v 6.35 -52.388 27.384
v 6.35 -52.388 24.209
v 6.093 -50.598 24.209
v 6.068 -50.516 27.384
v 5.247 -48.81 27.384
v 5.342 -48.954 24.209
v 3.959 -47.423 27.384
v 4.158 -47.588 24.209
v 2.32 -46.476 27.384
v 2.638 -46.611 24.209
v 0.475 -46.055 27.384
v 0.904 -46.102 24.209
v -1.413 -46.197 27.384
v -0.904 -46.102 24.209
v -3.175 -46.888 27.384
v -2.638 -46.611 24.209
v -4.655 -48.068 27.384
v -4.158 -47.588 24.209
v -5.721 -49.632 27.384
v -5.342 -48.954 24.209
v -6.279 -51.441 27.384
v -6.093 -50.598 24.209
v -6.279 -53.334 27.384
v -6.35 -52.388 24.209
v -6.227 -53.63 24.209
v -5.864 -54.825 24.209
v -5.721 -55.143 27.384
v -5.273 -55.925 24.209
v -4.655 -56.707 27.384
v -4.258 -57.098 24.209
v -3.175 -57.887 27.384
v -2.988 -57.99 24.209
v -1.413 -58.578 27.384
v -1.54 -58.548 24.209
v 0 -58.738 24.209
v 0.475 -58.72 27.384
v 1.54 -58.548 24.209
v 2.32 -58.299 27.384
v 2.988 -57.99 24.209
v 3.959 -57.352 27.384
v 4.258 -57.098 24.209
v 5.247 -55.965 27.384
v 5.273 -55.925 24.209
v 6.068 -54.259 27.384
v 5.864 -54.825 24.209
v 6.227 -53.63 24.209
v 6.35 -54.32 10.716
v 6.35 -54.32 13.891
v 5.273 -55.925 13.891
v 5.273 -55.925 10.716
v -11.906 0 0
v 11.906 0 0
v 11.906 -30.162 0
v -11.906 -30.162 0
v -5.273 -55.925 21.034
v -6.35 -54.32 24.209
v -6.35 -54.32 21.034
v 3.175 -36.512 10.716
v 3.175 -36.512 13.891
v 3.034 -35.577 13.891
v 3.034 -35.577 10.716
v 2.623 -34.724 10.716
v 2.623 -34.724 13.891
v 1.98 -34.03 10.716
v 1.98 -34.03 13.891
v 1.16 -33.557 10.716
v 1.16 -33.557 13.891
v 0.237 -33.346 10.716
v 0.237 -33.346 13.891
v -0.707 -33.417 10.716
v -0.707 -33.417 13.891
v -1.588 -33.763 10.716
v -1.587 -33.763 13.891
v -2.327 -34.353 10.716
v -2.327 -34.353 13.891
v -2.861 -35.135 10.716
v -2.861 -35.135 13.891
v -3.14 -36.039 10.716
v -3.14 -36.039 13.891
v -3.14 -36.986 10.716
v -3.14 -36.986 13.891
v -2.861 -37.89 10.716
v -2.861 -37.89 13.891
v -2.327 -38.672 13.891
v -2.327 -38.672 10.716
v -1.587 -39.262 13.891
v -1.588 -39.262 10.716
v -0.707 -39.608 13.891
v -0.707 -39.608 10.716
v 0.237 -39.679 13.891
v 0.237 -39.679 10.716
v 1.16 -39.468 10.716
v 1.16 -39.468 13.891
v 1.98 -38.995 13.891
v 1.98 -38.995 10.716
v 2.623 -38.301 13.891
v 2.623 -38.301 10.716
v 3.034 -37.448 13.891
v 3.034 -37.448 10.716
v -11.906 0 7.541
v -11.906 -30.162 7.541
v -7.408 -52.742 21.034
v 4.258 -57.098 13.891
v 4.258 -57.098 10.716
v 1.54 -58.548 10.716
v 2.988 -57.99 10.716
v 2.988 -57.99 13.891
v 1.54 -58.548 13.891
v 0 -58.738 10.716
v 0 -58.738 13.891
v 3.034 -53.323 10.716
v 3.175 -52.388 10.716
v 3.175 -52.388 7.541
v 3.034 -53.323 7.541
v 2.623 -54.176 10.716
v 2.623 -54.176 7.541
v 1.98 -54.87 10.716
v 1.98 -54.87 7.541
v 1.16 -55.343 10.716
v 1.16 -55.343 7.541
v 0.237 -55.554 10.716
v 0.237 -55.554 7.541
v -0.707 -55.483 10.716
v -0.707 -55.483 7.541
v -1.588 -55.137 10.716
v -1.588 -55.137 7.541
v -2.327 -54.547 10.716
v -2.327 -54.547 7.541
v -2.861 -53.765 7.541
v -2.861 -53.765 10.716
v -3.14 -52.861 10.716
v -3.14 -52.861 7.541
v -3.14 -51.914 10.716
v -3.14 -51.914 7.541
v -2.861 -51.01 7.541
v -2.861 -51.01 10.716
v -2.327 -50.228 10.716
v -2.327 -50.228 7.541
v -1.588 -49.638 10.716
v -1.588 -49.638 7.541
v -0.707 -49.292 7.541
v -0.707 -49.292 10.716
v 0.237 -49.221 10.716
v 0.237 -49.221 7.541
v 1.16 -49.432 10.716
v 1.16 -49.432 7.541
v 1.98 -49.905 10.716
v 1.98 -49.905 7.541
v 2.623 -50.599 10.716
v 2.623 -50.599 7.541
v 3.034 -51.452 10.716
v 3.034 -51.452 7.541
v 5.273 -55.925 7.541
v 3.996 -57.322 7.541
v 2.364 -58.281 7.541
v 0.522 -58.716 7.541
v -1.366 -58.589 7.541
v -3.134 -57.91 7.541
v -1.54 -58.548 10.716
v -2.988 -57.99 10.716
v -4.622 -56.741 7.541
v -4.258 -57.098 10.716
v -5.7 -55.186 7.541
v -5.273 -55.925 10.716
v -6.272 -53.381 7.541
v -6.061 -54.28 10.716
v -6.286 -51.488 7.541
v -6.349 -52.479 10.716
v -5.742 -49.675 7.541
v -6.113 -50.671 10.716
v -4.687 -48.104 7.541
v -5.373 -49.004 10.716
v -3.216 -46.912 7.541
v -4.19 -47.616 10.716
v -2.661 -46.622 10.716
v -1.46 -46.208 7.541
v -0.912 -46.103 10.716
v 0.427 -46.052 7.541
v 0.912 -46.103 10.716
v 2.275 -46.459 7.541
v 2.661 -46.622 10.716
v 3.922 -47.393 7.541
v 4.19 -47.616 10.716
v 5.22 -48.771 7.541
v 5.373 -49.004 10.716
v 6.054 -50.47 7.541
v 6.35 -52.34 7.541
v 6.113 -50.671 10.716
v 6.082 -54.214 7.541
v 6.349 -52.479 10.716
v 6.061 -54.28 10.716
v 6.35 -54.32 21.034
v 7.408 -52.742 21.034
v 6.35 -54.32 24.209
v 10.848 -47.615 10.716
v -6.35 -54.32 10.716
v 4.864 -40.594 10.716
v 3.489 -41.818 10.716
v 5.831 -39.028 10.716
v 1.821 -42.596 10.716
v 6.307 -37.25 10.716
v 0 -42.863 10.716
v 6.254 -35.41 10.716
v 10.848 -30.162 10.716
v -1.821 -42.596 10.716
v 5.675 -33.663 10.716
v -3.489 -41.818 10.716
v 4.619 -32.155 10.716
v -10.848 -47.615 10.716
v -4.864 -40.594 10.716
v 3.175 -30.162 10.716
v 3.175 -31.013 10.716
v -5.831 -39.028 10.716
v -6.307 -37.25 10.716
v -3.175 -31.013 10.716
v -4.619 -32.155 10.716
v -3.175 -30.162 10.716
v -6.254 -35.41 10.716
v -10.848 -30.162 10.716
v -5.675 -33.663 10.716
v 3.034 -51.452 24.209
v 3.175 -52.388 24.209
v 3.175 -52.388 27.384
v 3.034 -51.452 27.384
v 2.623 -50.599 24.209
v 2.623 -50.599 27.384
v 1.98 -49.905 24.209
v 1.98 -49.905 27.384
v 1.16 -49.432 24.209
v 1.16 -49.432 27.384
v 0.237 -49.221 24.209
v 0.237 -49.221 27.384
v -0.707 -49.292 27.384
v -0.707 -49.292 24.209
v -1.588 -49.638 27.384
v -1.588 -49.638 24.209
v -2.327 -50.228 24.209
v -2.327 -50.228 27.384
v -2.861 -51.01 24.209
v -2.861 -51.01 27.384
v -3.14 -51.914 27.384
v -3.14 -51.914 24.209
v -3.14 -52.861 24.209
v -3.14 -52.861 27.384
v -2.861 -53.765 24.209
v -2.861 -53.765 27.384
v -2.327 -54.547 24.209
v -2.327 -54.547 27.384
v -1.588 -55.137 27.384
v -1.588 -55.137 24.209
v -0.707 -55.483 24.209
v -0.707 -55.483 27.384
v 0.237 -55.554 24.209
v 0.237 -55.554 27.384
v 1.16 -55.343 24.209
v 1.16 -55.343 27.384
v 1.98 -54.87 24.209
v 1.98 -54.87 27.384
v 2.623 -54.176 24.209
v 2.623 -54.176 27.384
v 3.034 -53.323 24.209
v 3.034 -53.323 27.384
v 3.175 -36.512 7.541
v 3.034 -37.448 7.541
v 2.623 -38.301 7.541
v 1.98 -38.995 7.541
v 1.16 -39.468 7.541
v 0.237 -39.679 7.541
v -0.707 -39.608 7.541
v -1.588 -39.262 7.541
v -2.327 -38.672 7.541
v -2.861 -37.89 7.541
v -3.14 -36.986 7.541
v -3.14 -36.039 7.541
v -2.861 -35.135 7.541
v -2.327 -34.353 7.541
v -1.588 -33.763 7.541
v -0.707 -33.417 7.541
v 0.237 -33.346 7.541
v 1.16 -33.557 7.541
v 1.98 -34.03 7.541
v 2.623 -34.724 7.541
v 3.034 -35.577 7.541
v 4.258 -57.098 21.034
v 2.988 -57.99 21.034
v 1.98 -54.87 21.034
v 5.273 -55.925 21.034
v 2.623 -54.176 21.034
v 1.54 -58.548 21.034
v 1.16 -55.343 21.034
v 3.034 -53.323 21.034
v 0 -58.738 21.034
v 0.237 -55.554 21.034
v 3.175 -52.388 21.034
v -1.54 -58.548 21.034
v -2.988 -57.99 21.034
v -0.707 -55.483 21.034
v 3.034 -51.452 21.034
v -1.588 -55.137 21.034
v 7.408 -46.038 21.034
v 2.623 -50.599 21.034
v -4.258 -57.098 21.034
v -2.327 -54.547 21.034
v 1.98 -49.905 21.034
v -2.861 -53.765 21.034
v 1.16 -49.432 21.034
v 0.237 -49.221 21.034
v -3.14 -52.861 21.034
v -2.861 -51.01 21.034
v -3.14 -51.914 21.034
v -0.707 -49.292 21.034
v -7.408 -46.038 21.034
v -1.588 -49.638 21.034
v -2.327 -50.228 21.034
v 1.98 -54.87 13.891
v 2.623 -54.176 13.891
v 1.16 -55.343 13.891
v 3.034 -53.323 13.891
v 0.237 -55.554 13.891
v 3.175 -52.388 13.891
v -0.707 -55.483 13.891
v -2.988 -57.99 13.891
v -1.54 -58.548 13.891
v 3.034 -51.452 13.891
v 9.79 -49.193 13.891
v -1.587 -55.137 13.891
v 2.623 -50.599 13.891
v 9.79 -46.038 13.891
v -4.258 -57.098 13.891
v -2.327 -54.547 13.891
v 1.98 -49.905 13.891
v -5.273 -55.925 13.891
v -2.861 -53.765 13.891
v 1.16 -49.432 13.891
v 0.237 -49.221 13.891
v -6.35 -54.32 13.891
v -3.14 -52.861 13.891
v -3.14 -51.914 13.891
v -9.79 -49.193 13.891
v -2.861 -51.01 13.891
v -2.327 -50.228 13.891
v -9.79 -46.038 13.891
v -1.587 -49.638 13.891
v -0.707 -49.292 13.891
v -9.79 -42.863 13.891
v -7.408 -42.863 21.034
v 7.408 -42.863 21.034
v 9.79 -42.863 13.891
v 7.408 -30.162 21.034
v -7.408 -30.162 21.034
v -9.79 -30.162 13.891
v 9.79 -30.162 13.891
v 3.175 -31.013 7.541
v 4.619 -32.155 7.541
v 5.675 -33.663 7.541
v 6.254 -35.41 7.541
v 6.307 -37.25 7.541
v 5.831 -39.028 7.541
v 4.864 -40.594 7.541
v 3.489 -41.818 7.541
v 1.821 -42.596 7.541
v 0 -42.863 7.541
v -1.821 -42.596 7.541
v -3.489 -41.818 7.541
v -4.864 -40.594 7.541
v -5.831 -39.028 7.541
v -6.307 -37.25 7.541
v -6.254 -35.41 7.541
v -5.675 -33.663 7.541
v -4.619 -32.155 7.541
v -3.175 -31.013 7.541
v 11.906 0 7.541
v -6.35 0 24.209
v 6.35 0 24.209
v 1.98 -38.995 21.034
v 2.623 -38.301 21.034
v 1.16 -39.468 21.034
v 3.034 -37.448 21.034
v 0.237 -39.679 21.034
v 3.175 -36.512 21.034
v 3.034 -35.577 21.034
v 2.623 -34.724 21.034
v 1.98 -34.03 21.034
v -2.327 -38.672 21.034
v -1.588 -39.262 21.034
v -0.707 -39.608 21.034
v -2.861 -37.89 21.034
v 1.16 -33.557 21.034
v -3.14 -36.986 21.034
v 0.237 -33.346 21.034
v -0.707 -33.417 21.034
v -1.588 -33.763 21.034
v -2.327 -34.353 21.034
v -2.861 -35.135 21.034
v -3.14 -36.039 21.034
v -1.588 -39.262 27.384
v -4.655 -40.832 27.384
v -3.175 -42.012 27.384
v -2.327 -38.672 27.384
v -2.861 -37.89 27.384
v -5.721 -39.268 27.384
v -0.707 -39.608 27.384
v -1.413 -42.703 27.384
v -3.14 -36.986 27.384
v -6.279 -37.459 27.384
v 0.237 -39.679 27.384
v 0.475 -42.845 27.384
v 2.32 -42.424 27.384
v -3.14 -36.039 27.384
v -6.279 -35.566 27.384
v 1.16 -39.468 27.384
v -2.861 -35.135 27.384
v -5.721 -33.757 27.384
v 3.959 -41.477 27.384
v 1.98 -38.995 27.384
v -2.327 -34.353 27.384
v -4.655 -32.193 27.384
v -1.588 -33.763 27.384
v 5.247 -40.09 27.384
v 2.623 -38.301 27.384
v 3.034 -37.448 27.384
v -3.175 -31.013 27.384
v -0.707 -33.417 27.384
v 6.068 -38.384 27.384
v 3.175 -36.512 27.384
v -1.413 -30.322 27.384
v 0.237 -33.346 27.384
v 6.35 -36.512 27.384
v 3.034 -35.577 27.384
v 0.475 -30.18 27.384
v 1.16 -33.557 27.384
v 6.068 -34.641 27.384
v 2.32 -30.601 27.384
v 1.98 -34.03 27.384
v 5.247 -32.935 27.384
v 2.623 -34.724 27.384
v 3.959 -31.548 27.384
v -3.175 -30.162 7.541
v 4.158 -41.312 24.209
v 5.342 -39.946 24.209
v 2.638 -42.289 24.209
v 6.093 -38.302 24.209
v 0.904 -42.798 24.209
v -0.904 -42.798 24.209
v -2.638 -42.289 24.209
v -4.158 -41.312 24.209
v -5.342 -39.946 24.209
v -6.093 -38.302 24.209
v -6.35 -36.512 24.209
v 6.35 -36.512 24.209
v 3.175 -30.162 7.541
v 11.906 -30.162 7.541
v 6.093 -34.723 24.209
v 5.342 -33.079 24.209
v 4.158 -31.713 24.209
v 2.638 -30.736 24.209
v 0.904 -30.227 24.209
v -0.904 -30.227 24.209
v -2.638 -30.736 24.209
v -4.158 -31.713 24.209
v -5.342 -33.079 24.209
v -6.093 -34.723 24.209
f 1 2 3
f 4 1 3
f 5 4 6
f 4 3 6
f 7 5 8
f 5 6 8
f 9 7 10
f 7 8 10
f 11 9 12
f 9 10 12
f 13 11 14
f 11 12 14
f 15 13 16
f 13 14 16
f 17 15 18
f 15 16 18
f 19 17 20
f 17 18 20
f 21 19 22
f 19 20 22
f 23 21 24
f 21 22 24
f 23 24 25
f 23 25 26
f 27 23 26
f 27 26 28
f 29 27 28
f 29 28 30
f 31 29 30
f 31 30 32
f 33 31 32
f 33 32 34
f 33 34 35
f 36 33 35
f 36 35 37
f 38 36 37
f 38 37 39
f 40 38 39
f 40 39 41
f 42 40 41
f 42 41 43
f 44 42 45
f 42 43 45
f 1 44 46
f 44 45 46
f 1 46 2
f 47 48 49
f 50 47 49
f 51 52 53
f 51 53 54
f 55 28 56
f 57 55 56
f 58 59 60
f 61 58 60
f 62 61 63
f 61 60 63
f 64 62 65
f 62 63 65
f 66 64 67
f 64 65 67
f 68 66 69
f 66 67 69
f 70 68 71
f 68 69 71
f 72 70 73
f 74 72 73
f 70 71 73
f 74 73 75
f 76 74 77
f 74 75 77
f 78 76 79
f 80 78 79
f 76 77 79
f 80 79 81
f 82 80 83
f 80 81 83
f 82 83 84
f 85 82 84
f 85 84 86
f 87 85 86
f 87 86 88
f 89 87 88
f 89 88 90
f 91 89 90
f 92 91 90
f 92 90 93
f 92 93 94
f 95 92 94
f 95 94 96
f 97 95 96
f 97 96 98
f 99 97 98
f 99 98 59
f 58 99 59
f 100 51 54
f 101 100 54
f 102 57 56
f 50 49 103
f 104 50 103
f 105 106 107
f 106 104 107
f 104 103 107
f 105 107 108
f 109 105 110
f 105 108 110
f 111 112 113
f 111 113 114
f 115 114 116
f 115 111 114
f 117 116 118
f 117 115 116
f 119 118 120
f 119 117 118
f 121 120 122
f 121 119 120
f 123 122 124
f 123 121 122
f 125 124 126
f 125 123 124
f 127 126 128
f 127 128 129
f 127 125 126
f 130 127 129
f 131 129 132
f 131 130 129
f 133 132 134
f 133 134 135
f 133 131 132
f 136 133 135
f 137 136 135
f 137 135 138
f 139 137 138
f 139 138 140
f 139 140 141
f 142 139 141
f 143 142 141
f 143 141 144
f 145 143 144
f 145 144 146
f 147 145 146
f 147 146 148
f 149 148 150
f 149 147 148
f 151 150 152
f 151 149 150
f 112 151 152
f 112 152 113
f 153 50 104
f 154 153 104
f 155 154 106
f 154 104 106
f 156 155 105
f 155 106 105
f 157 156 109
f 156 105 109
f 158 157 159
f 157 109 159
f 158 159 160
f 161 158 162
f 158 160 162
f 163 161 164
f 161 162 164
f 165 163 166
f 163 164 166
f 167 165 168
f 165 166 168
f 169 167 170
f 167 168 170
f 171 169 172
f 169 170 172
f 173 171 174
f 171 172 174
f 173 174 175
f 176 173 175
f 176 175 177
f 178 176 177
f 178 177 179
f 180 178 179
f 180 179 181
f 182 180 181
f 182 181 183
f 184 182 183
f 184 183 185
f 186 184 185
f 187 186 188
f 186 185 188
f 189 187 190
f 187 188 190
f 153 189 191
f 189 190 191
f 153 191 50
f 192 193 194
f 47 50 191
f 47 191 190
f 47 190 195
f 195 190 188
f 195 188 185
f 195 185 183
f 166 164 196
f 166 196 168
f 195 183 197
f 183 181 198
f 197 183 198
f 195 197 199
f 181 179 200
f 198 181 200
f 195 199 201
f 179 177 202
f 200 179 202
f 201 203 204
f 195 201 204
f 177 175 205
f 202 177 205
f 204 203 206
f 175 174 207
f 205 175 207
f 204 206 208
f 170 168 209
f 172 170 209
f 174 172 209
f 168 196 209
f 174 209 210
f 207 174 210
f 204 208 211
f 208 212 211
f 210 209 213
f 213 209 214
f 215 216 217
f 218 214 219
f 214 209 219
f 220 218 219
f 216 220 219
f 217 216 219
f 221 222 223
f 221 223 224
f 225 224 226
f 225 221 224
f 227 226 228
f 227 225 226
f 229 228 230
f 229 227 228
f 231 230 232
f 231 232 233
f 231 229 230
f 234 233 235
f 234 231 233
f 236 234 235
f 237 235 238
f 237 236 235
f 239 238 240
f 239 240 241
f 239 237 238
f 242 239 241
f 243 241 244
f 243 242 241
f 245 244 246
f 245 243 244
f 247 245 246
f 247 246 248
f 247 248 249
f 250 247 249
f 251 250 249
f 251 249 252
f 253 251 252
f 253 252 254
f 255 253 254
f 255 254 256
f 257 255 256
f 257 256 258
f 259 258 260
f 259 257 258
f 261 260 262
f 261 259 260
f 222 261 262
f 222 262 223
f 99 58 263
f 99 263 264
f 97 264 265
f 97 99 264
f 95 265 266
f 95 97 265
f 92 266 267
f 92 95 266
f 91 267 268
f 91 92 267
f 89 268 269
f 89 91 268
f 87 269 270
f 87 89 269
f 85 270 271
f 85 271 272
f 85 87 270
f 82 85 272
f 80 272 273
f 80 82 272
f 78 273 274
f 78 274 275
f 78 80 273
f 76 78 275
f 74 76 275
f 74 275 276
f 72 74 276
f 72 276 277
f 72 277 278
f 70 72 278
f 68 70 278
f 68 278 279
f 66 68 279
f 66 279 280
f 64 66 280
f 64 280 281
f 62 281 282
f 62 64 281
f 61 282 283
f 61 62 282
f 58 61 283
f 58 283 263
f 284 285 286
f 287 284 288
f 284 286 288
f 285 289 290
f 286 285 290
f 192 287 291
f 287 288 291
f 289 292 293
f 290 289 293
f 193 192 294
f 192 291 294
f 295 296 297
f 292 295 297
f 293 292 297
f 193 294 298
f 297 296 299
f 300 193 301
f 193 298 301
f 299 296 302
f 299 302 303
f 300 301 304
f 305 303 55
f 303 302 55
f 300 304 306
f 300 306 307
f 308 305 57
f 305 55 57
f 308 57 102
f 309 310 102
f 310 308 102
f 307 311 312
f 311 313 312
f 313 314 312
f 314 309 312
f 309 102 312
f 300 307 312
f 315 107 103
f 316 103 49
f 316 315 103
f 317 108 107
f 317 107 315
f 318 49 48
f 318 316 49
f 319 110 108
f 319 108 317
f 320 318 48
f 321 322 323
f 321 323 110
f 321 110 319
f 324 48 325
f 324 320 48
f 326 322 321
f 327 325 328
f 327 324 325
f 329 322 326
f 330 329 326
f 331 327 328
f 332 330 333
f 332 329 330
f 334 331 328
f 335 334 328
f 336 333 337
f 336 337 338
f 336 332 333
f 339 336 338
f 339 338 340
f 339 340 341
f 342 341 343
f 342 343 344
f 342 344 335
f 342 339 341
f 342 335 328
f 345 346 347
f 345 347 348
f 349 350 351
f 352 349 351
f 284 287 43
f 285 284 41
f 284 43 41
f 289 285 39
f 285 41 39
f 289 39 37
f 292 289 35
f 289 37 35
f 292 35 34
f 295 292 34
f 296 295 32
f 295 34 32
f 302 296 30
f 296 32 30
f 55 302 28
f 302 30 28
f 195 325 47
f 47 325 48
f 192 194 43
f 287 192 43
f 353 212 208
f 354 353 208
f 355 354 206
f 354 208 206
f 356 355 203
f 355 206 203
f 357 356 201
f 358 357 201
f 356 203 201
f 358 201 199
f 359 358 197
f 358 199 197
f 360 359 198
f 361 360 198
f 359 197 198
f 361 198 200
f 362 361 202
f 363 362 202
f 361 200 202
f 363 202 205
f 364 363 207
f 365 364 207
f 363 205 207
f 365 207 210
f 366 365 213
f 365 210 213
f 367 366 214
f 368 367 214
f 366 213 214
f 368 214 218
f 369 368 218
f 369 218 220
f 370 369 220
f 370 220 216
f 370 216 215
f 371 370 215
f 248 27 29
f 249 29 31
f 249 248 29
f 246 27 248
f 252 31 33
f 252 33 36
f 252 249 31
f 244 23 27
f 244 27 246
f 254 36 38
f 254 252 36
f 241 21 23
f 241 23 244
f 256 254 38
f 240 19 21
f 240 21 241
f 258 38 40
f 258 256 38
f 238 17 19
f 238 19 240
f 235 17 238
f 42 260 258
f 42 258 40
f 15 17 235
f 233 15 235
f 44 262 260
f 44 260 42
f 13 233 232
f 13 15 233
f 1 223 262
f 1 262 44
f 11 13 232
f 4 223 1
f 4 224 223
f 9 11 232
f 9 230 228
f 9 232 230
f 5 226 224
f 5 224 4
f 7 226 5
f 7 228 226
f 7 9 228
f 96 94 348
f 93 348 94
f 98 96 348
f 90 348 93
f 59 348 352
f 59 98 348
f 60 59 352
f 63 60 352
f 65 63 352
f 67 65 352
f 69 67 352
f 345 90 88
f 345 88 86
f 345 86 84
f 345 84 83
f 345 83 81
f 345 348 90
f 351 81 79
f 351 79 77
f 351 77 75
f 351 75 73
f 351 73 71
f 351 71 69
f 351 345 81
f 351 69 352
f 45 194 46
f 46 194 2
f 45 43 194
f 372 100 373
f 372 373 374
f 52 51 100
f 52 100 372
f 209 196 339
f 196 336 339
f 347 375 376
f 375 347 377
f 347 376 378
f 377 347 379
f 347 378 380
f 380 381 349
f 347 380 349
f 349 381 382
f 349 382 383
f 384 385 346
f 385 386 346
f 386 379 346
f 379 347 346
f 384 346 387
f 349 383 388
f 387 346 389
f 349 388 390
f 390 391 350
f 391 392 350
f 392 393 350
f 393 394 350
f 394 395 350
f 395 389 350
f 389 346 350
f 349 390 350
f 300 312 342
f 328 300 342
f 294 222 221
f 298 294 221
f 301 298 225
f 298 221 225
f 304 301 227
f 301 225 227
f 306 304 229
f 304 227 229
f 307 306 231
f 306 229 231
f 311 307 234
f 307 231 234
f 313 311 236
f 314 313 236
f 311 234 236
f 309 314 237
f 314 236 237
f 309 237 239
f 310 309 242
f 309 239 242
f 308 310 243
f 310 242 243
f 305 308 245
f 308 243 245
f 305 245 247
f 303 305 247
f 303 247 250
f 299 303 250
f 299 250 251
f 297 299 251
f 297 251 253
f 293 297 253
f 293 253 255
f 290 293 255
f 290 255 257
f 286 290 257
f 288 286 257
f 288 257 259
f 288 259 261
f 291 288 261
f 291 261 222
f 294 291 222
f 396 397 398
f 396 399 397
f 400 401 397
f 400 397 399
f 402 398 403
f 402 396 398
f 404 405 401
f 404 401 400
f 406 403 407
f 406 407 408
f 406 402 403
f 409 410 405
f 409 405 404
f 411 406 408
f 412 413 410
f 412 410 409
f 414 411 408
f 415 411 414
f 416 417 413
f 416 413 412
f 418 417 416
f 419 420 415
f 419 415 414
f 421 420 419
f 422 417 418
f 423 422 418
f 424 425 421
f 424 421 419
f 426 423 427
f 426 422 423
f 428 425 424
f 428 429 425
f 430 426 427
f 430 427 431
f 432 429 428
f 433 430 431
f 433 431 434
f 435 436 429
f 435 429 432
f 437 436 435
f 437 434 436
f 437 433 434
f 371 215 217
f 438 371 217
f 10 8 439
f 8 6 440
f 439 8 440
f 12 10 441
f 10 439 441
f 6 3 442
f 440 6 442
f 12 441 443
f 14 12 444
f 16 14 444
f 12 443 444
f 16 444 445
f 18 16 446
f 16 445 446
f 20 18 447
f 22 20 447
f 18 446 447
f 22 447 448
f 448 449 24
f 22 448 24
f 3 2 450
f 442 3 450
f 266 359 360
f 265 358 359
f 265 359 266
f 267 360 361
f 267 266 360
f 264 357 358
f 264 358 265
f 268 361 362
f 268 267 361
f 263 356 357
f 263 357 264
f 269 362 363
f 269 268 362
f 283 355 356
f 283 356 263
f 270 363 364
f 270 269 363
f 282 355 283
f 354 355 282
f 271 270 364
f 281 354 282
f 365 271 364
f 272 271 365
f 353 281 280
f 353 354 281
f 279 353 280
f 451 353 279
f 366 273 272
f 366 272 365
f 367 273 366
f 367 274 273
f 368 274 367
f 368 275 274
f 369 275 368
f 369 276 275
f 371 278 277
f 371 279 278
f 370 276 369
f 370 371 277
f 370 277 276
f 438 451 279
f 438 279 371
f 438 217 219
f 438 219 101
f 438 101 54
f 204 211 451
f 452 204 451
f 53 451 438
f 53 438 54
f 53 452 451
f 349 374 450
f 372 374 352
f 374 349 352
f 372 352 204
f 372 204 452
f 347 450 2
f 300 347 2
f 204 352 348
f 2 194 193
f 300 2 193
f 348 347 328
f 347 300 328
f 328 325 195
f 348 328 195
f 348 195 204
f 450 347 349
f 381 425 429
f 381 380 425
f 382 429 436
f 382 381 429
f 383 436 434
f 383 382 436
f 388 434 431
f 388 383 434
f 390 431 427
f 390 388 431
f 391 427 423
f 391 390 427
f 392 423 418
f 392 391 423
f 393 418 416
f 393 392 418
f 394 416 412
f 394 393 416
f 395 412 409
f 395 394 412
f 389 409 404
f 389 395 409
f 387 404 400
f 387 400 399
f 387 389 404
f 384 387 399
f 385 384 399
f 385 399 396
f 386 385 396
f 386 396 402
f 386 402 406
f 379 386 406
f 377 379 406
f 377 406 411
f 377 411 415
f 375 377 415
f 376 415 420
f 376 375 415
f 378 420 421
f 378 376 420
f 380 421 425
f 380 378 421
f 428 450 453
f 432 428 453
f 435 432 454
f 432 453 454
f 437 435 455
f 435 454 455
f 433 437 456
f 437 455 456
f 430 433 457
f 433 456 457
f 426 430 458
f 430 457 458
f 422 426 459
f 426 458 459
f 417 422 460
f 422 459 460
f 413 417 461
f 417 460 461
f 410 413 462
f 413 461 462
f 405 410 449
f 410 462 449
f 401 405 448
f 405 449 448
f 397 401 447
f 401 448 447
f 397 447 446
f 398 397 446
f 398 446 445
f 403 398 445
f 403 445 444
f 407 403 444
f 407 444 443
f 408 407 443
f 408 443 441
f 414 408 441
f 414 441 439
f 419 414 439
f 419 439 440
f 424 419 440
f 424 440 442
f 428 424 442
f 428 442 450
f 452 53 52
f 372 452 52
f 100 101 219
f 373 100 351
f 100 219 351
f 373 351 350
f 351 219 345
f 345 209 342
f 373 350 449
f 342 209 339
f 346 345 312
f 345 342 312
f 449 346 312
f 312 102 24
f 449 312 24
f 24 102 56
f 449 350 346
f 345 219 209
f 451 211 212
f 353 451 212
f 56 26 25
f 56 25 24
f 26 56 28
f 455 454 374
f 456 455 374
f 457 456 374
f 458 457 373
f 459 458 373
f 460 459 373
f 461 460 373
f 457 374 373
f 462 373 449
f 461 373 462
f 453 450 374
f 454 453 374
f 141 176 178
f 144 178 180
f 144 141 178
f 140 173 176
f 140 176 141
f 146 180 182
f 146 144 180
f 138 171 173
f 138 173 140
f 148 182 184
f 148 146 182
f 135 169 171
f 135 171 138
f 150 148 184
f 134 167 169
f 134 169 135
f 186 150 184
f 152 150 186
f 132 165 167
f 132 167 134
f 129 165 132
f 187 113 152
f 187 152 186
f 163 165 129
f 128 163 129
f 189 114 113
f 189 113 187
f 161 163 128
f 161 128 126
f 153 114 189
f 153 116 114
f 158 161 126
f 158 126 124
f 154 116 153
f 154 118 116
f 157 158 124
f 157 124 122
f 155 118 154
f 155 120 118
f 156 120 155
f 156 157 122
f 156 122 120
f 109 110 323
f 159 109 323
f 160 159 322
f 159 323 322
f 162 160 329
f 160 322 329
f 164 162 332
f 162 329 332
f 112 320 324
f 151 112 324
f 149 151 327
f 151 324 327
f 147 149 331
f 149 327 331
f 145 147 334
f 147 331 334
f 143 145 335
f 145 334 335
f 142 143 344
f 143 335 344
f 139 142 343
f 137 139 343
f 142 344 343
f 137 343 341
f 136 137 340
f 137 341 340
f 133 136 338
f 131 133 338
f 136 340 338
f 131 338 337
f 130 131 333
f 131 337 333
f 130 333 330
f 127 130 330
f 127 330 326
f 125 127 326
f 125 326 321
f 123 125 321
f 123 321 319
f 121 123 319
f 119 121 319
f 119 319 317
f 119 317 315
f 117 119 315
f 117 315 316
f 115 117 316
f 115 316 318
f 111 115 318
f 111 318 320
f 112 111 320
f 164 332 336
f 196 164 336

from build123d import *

# Parameters (mm, degrees)
BOSS_EXTRUDE1_DEPTH     = 24.209375
CUT_EXTRUDE1_DEPTH      = 65.637036854
CUT_EXTRUDE2_DEPTH      = 65.637036854
SKETCH4_R               = 3.175
CUT_EXTRUDE3_DEPTH      = 65.637036854
SKETCH5_W               = 7.14375
SKETCH5_H               = 12.7
SKETCH5_W_2             = 10.715625
SKETCH5_H_2             = 28.575
CUT_EXTRUDE4_DEPTH      = 65.637036854
CUT_EXTRUDE4_DEPTH_BACK = 65.637036854
SKETCH6_R               = 6.35
SKETCH6_R_2             = 3.175
BOSS_EXTRUDE2_DEPTH     = 3.175
SKETCH7_R               = 6.35
SKETCH7_R_2             = 3.175
BOSS_EXTRUDE4_DEPTH     = 3.175


with BuildPart() as part:
    # Sketch1 → Boss-Extrude1 (new body)
    with BuildSketch(Plane.XY):
        Polygon((-11.90625, 0), (11.90625, 0), (11.90625, -25.4), (11.90625, -58.7375), (-11.90625, -58.7375), (-11.90625, -25.4), align=None)
    extrude(amount=BOSS_EXTRUDE1_DEPTH)

    # Sketch2 → Cut-Extrude1 (cut, through all)
    with BuildSketch(Plane.XZ.offset(58.7375)):
        Polygon((-11.90625, 24.209375), (-11.90625, 7.540625), (-6.35, 24.209375), align=None)
        Polygon((11.90625, 24.209375), (6.35, 24.209375), (11.90625, 7.540625), align=None)
    extrude(amount=-CUT_EXTRUDE1_DEPTH, mode=Mode.SUBTRACT)

    # Sketch3 → Cut-Extrude2 (cut, through all)
    with BuildSketch(Plane.XY.offset(24.209375)):
        Polygon((-11.90625, -58.7375), (-6.35, -58.7375), (-6.35, -54.320108696), (-11.90625, -46.0375), align=None)
        Polygon((11.90625, -46.0375), (6.35, -54.320108696), (6.35, -58.7375), (11.90625, -58.7375), align=None)
        with BuildLine():
            Line((6.35, -54.320108696), (5.273356401, -55.925043253))
            ThreePointArc((5.273356401, -55.925043253), (2.988235294, -57.990441176), (0, -58.7375))
            Line((0, -58.7375), (6.35, -58.7375))
            Line((6.35, -58.7375), (6.35, -54.320108696))
        make_face()
        with BuildLine():
            Line((-6.35, -58.7375), (0, -58.7375))
            ThreePointArc((0, -58.7375), (-2.988235294, -57.990441176), (-5.273356401, -55.925043253))
            Line((-5.273356401, -55.925043253), (-6.35, -54.320108696))
            Line((-6.35, -54.320108696), (-6.35, -58.7375))
        make_face()
    extrude(amount=-CUT_EXTRUDE2_DEPTH, mode=Mode.SUBTRACT)

    # Sketch4 → Cut-Extrude3 (cut, through all)
    with BuildSketch(Plane.XY.offset(24.209375)):
        with Locations((0, -52.3875)):
            Circle(SKETCH4_R)
        with Locations((0, -36.5125)):
            Circle(SKETCH4_R)
    extrude(amount=-CUT_EXTRUDE3_DEPTH, mode=Mode.SUBTRACT)

    # Sketch5 → Cut-Extrude4 (cut, two sides)
    with BuildSketch(Plane(origin=(0, 0, 0), x_dir=(0, 0, -1), z_dir=(1, 0, 0))) as cut_extrude4_sk:
        with Locations((-17.4625, -52.3875)):
            Rectangle(SKETCH5_W, SKETCH5_H)
        with Locations((-17.4625, -36.5125)):
            Rectangle(SKETCH5_W, SKETCH5_H)
        with Locations((-5.3578125, -44.45)):
            Rectangle(SKETCH5_W_2, SKETCH5_H_2)
    extrude(amount=CUT_EXTRUDE4_DEPTH, mode=Mode.SUBTRACT)
    extrude(cut_extrude4_sk.sketch, amount=-CUT_EXTRUDE4_DEPTH_BACK, mode=Mode.SUBTRACT)

    # Sketch6 → Boss-Extrude2 (add)
    with BuildSketch(Plane.XY.offset(24.209375)):
        with Locations((0, -36.5125)):
            Circle(SKETCH6_R)
        with Locations((0, -36.5125)):
            Circle(SKETCH6_R_2, mode=Mode.SUBTRACT)
        with Locations((0, -52.3875)):
            Circle(SKETCH6_R)
        with Locations((0, -52.3875)):
            Circle(SKETCH6_R_2, mode=Mode.SUBTRACT)
    extrude(amount=BOSS_EXTRUDE2_DEPTH)

    # Sketch7 → Boss-Extrude4 (add)
    with BuildSketch(Plane(origin=(0, 0, 10.715625), x_dir=(-1, 0, 0), z_dir=(0, 0, -1))):
        with Locations(Location((0, -52.3875, 0), (0, 0, 213.855026128))):
            Circle(SKETCH7_R)
        with Locations(Location((0, -52.3875, 0), (0, 0, 180))):
            Circle(SKETCH7_R_2, mode=Mode.SUBTRACT)
        with BuildLine():
            Line((-3.175, -30.1625), (-3.175, -31.013238686))
            ThreePointArc((-3.175, -31.013238686), (0, -42.8625), (3.175, -31.013238686))
            Line((3.175, -31.013238686), (3.175, -30.1625))
            Line((3.175, -30.1625), (-3.175, -30.1625))
        make_face()
        with Locations(Location((0, -36.5125, 0), (0, 0, 180))):
            Circle(SKETCH7_R_2, mode=Mode.SUBTRACT)
    extrude(amount=BOSS_EXTRUDE4_DEPTH)


solid = part.part
